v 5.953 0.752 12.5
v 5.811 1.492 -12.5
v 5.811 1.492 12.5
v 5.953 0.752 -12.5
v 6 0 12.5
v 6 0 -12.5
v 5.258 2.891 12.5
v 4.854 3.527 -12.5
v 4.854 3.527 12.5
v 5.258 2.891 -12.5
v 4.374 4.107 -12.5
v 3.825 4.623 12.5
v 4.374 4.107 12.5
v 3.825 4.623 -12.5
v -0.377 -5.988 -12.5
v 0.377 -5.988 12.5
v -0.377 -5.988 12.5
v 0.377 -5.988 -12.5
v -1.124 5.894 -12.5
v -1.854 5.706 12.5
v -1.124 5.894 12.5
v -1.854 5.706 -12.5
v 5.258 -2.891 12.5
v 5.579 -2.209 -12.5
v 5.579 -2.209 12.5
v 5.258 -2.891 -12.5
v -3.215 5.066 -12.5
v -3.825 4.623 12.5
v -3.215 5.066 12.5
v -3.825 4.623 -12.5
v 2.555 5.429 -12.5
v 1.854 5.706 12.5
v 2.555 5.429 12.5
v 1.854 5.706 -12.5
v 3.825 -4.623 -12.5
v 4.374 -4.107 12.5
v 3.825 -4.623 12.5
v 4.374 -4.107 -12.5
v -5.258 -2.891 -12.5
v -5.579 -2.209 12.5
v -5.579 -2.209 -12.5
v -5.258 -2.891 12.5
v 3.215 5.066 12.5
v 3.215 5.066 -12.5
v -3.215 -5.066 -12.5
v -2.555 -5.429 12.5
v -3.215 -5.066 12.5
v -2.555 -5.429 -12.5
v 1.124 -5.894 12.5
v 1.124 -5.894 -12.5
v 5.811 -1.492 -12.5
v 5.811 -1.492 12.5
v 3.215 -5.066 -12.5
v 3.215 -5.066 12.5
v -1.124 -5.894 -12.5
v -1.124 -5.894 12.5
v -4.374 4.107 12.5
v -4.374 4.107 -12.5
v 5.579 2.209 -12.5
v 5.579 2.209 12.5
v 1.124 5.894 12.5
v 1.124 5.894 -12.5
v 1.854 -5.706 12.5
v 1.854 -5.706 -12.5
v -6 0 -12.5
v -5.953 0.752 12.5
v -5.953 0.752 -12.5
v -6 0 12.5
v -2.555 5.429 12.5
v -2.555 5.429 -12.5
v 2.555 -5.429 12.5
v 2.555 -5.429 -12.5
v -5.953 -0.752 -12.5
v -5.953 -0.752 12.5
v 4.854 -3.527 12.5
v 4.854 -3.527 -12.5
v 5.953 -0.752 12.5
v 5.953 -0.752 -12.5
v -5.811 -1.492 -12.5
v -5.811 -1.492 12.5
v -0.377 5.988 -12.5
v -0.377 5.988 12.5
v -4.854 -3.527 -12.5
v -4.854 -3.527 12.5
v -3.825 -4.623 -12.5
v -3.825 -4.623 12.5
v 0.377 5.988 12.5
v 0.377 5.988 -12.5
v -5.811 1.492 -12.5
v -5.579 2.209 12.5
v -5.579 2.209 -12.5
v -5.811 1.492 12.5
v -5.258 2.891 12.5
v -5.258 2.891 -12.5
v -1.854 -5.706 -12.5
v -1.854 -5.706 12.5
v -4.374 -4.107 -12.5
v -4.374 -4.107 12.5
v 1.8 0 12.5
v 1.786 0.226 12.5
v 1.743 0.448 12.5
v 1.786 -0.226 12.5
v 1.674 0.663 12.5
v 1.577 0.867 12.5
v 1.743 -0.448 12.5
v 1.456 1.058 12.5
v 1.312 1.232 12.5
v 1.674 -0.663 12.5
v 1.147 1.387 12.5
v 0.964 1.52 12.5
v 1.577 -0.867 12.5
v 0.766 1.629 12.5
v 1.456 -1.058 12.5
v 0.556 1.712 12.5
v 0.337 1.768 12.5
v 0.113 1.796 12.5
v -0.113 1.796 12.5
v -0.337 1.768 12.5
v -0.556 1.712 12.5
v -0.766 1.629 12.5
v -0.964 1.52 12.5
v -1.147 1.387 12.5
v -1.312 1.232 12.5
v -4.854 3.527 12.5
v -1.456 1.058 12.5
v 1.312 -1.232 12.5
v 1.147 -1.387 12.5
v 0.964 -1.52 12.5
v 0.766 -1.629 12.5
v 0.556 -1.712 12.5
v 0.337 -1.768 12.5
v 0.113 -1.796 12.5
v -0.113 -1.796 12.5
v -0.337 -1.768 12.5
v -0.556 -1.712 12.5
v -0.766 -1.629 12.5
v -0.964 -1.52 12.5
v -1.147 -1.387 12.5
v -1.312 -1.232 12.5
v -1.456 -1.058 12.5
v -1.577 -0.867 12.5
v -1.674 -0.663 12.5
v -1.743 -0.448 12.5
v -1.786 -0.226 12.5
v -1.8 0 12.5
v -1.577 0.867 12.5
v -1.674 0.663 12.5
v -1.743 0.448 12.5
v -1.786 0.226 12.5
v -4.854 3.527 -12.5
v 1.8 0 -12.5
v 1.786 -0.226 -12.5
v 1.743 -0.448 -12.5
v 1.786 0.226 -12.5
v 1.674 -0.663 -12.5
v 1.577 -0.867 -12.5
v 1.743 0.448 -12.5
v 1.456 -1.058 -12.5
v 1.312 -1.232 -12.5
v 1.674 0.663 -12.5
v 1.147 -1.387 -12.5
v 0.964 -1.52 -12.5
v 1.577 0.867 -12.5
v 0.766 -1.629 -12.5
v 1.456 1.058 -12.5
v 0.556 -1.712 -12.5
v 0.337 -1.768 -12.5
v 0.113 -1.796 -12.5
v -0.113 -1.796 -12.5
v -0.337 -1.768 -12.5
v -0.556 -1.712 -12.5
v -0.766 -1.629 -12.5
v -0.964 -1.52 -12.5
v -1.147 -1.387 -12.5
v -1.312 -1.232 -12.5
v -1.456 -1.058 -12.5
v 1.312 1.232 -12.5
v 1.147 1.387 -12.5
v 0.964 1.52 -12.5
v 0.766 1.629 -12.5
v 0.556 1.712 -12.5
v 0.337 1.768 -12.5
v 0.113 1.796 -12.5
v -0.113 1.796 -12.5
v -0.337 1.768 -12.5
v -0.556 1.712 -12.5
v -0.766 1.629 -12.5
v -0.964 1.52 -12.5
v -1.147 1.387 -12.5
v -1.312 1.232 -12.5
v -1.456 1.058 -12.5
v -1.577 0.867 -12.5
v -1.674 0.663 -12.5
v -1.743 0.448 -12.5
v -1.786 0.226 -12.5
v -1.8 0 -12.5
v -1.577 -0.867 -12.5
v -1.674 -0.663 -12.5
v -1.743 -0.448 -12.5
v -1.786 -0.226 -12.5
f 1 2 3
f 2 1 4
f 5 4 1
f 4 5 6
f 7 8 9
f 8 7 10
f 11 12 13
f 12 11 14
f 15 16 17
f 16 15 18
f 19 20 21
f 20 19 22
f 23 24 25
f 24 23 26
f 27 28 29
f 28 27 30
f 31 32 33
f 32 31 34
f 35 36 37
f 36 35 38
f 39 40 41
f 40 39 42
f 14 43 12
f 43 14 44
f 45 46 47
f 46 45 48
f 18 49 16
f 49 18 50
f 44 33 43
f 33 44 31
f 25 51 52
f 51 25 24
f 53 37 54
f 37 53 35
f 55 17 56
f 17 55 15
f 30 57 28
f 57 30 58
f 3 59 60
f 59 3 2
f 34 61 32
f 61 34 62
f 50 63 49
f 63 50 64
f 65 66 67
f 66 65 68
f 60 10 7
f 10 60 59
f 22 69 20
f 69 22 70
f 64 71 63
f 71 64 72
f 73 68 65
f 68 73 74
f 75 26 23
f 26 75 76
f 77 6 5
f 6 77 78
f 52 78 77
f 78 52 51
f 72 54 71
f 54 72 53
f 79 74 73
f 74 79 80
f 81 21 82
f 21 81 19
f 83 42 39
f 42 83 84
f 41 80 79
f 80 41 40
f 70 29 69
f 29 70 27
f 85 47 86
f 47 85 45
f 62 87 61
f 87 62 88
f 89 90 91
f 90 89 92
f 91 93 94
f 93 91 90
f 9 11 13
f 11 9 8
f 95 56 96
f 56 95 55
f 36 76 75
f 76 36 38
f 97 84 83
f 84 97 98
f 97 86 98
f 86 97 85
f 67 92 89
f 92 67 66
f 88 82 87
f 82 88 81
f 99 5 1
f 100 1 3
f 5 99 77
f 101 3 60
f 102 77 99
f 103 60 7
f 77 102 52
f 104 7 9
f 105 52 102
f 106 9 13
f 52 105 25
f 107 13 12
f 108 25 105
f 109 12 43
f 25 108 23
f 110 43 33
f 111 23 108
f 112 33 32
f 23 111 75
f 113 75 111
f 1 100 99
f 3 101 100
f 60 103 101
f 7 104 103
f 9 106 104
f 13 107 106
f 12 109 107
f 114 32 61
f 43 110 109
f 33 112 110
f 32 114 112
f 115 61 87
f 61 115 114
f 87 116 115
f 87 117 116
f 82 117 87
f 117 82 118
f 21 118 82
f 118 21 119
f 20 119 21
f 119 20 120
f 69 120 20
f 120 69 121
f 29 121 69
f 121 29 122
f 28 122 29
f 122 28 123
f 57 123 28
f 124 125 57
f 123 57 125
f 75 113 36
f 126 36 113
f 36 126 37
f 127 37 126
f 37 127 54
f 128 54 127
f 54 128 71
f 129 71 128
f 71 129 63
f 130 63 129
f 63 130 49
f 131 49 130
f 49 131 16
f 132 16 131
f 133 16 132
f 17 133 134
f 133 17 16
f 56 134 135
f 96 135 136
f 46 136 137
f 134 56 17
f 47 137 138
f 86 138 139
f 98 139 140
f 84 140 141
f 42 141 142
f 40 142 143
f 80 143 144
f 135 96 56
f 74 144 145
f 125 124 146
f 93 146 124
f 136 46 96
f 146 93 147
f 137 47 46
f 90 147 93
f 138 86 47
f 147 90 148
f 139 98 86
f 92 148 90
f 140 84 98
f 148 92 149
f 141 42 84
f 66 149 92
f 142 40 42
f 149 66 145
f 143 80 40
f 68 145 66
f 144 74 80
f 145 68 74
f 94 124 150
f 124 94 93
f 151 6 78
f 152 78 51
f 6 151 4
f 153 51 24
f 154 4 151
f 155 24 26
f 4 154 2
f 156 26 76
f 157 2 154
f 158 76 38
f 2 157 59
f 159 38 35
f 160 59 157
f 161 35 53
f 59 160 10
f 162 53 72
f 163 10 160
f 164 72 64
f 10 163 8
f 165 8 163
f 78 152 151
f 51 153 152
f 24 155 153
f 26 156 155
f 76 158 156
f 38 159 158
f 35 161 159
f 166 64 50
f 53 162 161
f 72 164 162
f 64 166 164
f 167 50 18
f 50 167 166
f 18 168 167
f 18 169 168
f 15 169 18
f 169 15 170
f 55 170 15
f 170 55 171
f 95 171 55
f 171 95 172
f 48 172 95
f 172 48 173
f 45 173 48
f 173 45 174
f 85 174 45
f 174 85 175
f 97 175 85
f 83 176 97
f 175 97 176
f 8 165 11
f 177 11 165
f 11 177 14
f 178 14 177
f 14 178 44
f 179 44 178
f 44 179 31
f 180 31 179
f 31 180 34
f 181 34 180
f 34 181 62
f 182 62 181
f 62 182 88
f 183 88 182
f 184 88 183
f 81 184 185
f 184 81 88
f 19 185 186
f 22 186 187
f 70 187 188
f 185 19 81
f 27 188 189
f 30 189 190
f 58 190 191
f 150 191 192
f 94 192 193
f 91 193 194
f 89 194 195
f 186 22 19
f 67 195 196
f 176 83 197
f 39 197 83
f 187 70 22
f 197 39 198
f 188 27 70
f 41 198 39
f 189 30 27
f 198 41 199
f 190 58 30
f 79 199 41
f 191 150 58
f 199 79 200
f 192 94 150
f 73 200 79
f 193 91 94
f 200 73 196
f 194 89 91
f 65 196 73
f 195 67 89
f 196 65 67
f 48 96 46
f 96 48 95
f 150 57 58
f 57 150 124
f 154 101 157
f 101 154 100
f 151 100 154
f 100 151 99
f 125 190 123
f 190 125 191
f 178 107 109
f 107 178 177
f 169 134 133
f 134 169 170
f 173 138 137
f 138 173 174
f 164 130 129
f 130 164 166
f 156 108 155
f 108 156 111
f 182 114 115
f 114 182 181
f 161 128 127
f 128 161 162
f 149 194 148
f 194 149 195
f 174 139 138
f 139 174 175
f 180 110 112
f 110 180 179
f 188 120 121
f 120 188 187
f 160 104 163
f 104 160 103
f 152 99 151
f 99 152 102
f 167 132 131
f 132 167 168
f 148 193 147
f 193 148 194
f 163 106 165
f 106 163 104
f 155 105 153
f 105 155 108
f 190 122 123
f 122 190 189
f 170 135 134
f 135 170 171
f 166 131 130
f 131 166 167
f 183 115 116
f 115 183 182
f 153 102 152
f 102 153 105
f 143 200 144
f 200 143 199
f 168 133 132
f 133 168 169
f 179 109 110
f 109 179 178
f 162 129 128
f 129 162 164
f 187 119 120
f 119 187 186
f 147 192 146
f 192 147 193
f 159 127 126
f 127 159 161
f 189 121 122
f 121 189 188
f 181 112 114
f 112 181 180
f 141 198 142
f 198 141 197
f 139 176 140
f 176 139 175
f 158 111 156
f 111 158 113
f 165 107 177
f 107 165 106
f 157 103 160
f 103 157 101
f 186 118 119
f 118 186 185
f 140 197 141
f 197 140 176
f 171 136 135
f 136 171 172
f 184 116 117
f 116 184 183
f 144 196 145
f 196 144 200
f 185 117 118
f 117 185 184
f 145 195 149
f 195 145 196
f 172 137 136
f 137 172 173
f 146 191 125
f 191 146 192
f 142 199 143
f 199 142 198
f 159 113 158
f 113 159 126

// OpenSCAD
$fn = 50;


difference() {
	union() {
		translate(v = [0, 0, -12.5000000000]) {
			cylinder(h = 25, r = 6.0000000000);
		}
	}
	union() {
		#translate(v = [0, 0, -100.0000000000]) {
			cylinder(h = 200, r = 1.8000000000);
		}
	}
}
